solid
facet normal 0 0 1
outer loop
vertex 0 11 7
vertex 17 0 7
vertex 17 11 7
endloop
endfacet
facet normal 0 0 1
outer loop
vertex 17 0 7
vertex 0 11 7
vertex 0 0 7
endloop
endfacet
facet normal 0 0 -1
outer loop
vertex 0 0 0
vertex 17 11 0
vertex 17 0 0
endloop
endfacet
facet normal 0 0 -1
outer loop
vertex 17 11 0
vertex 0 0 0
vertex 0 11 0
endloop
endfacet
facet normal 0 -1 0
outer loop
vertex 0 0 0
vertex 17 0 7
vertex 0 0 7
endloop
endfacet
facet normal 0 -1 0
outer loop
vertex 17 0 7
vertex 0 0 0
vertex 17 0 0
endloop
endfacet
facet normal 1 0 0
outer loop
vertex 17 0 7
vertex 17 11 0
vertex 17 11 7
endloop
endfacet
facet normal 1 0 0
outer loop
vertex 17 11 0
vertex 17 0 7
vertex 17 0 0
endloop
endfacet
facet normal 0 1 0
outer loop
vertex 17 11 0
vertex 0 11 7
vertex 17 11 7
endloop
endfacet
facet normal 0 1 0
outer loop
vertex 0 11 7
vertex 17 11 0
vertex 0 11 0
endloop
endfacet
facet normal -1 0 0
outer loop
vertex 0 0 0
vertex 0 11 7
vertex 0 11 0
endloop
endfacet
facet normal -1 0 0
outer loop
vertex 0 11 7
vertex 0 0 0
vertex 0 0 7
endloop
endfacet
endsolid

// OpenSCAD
// Generated by SolidPython 1.0.1 on 2020-07-29 00:46:56


cube(size = [17, 11, 7]);
/***********************************************
*********      SolidPython code:      **********
************************************************
 
# import packages: SolidPython
from solid import *
from solid.utils import *
from itertools import chain, combinations, permutations


class Resize:

    def __init__(self, scad_file):
        self.scad_file = scad_file
        #self.scad_file = import_scad(scad_file)
        # cone/cylinder param:
        self.r1 = 0
        self.r2 = 0
        self.h = 0
        # rectangular prism param:
        self.w = 0
        self.l = 0
        # ellipse param:
        self.r = 0

    # import OpenScad code (file name corresponds to shape)


    # classify shape + parameters
    def assign(self, param1, param2, param3):
        if self.scad_file == 'cone.scad':
            self.r1 = param1
            self.r2 = param2
            self.h = param3
        elif self.scad_file == 'cylinder.scad':
            self.r1 = param1
            self.r2 = param2
            self.h = param3
        elif self.scad_file == 'rectangularPrism.scad':
            self.h = param1
            self.l = param2
            self.w = param3
        else:
            self.r = param1
            self.h = param2

    # resize parameters
    def iterate(self):
        x = range(3, 20, 2)
        i = 1
        if self.scad_file == 'cone.scad':
            tempList = list(permutations(x, 2))
            for temp in tempList:
                param1 = temp[0]
                param2 = temp[1]
                filepath = 'produced_scad_files/' + 'cone' + str(param1) + '_' + str(param2) + '_' + '.scad'
                scad_render_to_file(cylinder(h=param1, r1=param2, r2=0), filepath)

        elif self.scad_file == 'cylinder.scad':
            tempList = list(permutations(x, 3))
            for temp in tempList:
                param1 = temp[0]
                param2 = temp[1]
                filepath = 'produced_scad_files/' + 'cylinder' + str(param1) + '_' + str(param2) + '_' + '.scad'
                scad_render_to_file(cylinder(h=param1, r1=param2, r2=param2), filepath)

        elif self.scad_file == 'rectangularPrism.scad':
            tempList = list(permutations(x, 3))
            for temp in tempList:
                param1 = temp[0]
                param2 = temp[1]
                param3 = temp[2]
                filepath = 'produced_scad_files/' + 'rectangularPrism' + str(param1) + '_' + str(param2) + '_' + str(
                    param3) + '.scad'
                scad_render_to_file(cube(size=(param1, param2, param3)), filepath)

        elif self.scad_file == 'ellipse.scad':
            tempList = list(permutations(x, 4))
            for temp in tempList:
                param1 = temp[0]
                param2 = temp[1]
                param3 = temp[2]
                param4 = temp[3]
                filepath = 'produced_scad_files/' + 'ellipse' + str(param1) + '_' + str(param2) + '_' + str(param3) + '_' + str(param4) + '.scad'
                scad_render_to_file(scale([param1, param2, param3])(sphere(r=param4)), filepath)

    def render_to_scadfile(self):
        scad_render_to_file(scad, 'example.scad') 
 
************************************************/
